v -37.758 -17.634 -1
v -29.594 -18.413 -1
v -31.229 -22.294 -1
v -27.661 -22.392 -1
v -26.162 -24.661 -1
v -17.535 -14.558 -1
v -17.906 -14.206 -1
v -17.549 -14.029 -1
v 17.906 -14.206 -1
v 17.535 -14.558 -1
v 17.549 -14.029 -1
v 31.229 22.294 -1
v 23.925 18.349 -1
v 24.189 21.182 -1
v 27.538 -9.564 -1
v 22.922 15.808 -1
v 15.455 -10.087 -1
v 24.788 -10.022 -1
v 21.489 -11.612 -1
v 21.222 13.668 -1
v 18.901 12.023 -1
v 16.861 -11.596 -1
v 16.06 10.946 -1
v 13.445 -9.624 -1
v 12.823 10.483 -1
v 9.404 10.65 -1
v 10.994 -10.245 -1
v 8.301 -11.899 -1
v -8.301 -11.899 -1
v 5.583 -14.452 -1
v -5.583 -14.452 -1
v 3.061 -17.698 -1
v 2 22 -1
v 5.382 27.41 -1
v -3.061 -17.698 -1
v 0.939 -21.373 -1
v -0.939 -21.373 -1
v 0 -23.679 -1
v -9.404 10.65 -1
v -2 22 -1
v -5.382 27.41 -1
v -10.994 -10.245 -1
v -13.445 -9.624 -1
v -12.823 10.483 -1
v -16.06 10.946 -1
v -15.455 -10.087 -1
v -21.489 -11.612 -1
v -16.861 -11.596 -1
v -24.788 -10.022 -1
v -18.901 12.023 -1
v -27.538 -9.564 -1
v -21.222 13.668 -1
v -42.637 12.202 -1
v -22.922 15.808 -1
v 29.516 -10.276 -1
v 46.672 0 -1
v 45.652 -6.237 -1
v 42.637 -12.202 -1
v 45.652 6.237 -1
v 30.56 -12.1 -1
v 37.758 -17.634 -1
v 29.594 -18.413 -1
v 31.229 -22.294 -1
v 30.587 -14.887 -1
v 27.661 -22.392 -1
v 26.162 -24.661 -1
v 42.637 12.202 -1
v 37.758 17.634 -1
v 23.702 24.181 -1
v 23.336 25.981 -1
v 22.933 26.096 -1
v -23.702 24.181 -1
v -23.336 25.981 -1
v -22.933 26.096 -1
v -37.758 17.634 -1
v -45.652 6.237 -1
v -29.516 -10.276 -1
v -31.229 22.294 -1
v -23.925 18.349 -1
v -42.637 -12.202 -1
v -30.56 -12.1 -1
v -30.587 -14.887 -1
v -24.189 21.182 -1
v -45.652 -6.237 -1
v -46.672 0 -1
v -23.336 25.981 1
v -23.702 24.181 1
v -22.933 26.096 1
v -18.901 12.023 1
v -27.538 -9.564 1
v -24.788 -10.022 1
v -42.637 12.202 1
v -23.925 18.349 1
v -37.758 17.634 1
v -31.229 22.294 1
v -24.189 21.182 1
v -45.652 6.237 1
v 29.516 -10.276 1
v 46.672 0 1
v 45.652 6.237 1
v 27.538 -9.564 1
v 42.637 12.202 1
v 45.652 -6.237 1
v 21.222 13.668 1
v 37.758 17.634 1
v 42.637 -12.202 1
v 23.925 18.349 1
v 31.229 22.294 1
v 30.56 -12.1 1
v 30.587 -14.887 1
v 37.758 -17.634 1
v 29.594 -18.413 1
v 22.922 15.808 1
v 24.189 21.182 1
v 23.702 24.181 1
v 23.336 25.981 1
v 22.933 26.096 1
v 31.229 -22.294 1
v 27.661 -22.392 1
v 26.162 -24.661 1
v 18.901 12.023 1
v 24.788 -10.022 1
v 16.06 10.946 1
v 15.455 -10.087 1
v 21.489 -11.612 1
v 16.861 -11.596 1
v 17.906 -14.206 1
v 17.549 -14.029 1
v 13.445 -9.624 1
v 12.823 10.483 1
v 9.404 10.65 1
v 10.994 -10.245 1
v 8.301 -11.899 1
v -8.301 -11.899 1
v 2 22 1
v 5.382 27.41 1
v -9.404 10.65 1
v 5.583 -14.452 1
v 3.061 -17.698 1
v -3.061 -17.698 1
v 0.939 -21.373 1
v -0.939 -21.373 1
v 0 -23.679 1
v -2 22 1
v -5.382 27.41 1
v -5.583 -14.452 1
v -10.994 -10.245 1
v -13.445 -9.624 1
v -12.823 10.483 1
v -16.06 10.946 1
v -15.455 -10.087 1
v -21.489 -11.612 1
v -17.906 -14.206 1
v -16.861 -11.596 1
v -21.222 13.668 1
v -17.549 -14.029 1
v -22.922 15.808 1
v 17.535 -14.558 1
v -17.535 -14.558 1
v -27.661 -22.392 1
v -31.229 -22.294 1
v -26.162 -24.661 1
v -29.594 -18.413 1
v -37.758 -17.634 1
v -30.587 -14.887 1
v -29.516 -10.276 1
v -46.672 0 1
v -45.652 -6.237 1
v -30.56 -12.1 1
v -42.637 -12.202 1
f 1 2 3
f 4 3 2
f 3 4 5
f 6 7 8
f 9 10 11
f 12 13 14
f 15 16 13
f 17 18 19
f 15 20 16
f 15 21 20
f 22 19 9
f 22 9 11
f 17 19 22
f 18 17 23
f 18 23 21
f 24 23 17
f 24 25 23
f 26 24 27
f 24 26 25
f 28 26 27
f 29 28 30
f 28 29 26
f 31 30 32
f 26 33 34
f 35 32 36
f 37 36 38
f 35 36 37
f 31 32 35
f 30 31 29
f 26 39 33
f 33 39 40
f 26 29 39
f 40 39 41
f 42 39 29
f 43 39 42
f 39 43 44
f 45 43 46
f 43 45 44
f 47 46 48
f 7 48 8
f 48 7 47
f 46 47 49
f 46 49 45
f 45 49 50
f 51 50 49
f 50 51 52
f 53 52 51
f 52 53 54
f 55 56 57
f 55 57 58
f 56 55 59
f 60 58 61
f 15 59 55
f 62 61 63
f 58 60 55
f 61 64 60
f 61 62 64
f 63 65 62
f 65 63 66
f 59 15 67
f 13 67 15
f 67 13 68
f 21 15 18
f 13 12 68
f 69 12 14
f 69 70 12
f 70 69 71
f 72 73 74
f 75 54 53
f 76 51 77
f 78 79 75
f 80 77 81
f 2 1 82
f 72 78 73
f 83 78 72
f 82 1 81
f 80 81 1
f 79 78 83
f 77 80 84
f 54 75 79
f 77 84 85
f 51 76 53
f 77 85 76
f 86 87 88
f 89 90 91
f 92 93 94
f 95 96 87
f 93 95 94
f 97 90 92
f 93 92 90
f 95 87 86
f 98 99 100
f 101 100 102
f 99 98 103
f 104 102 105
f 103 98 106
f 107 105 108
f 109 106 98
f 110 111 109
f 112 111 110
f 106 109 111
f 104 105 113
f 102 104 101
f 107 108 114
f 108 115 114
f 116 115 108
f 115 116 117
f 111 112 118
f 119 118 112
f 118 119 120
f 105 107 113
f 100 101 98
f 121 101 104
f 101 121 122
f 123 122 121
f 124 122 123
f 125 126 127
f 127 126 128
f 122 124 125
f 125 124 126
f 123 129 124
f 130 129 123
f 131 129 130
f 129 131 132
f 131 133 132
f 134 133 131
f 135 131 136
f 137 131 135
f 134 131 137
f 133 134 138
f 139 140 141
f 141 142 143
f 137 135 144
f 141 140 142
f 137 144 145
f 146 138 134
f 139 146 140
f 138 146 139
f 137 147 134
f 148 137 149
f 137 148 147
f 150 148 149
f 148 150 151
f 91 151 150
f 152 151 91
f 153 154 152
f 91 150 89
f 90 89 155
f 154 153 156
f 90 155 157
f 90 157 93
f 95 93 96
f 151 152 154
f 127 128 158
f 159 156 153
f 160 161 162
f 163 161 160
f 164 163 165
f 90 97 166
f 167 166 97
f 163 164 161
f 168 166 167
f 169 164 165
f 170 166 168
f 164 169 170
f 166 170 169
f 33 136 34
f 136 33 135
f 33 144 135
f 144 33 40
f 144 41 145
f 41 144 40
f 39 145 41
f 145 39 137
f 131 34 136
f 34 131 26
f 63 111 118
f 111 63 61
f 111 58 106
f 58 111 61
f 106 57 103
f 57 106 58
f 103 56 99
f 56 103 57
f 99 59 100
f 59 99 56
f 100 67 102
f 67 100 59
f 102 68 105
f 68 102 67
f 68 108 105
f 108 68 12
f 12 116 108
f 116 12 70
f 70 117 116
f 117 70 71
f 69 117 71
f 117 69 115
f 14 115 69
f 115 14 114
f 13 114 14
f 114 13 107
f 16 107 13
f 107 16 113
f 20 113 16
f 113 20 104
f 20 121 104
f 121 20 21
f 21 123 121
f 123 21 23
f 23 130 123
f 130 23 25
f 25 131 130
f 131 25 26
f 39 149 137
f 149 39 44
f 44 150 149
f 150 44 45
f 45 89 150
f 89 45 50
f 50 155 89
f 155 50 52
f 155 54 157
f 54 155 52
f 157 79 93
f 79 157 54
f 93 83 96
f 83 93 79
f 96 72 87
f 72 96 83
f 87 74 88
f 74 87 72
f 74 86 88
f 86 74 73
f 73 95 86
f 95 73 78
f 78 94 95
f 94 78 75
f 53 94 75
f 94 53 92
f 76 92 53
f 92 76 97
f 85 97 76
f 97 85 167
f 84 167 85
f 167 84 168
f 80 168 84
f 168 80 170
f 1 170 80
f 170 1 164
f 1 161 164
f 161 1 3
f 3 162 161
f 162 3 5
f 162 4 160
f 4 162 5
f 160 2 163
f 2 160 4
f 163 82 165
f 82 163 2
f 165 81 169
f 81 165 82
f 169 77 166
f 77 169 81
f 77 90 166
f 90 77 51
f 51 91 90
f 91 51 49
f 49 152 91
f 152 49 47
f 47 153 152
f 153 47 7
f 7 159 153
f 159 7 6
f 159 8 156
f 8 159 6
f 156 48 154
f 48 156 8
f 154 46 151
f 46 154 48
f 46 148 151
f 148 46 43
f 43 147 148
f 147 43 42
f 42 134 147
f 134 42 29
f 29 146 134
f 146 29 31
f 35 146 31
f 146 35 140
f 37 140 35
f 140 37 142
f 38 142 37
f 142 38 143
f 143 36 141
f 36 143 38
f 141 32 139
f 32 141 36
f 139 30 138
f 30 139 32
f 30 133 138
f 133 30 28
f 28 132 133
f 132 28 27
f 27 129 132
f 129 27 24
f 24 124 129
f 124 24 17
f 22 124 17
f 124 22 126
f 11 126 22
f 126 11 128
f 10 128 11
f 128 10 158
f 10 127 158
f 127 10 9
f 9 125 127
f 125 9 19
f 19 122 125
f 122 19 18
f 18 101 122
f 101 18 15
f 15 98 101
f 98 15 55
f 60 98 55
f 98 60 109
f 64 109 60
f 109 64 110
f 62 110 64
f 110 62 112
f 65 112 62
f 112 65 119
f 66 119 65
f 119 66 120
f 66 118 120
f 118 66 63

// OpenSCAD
color([0.15,0.15,0.15])
linear_extrude(height = 2, center = true, convexity = 10, twist = 0)
difference(){

translate([0,20,0])
polygon(points=[[-9.8, -11], [9.8,-11],[3.8, 14],[-3.8, 14] ],paths=[[0,1,2,3]], convexity=10);

translate([0,30,0])
polygon(points=[[-2, -8], [2,-8],[12, 8],[-12, 8] ],paths=[[0,1,2,3]], convexity=10);
}

color([0.15,0.15,0.15])
linear_extrude(height = 2, center = true, convexity = 10, twist = 0)
difference(){

projection(cut=true) 
rotate([0,50,0])
cylinder(r=30, h=200, center=true);

translate([-8,-23,0]) 
rotate([0,0,-60])
projection(cut=true)
rotate([0,62,0])
cylinder(r=7, h=200, center=true);

translate([8,-23,0]) 
rotate([0,0,60])
projection(cut=true)
rotate([0,62,0])
cylinder(r=7, h=200, center=true);

translate([-18,-24,0]) 
rotate([0,0,-50])
projection(cut=true)
rotate([0,67,0])
cylinder(r=7, h=200, center=true);

translate([18,-24,0]) 
rotate([0,0,50])
projection(cut=true)
rotate([0,67,0])
cylinder(r=7, h=200, center=true);

union(){

translate([-7,25,0]) 
rotate([0,0,30])
projection(cut=true)
rotate([0,45,0])
cylinder(r=13, h=200, center=true);

translate([7,25,0]) 
rotate([0,0,-30])
projection(cut=true)
rotate([0,45,0])
cylinder(r=13, h=200, center=true);
}

}
